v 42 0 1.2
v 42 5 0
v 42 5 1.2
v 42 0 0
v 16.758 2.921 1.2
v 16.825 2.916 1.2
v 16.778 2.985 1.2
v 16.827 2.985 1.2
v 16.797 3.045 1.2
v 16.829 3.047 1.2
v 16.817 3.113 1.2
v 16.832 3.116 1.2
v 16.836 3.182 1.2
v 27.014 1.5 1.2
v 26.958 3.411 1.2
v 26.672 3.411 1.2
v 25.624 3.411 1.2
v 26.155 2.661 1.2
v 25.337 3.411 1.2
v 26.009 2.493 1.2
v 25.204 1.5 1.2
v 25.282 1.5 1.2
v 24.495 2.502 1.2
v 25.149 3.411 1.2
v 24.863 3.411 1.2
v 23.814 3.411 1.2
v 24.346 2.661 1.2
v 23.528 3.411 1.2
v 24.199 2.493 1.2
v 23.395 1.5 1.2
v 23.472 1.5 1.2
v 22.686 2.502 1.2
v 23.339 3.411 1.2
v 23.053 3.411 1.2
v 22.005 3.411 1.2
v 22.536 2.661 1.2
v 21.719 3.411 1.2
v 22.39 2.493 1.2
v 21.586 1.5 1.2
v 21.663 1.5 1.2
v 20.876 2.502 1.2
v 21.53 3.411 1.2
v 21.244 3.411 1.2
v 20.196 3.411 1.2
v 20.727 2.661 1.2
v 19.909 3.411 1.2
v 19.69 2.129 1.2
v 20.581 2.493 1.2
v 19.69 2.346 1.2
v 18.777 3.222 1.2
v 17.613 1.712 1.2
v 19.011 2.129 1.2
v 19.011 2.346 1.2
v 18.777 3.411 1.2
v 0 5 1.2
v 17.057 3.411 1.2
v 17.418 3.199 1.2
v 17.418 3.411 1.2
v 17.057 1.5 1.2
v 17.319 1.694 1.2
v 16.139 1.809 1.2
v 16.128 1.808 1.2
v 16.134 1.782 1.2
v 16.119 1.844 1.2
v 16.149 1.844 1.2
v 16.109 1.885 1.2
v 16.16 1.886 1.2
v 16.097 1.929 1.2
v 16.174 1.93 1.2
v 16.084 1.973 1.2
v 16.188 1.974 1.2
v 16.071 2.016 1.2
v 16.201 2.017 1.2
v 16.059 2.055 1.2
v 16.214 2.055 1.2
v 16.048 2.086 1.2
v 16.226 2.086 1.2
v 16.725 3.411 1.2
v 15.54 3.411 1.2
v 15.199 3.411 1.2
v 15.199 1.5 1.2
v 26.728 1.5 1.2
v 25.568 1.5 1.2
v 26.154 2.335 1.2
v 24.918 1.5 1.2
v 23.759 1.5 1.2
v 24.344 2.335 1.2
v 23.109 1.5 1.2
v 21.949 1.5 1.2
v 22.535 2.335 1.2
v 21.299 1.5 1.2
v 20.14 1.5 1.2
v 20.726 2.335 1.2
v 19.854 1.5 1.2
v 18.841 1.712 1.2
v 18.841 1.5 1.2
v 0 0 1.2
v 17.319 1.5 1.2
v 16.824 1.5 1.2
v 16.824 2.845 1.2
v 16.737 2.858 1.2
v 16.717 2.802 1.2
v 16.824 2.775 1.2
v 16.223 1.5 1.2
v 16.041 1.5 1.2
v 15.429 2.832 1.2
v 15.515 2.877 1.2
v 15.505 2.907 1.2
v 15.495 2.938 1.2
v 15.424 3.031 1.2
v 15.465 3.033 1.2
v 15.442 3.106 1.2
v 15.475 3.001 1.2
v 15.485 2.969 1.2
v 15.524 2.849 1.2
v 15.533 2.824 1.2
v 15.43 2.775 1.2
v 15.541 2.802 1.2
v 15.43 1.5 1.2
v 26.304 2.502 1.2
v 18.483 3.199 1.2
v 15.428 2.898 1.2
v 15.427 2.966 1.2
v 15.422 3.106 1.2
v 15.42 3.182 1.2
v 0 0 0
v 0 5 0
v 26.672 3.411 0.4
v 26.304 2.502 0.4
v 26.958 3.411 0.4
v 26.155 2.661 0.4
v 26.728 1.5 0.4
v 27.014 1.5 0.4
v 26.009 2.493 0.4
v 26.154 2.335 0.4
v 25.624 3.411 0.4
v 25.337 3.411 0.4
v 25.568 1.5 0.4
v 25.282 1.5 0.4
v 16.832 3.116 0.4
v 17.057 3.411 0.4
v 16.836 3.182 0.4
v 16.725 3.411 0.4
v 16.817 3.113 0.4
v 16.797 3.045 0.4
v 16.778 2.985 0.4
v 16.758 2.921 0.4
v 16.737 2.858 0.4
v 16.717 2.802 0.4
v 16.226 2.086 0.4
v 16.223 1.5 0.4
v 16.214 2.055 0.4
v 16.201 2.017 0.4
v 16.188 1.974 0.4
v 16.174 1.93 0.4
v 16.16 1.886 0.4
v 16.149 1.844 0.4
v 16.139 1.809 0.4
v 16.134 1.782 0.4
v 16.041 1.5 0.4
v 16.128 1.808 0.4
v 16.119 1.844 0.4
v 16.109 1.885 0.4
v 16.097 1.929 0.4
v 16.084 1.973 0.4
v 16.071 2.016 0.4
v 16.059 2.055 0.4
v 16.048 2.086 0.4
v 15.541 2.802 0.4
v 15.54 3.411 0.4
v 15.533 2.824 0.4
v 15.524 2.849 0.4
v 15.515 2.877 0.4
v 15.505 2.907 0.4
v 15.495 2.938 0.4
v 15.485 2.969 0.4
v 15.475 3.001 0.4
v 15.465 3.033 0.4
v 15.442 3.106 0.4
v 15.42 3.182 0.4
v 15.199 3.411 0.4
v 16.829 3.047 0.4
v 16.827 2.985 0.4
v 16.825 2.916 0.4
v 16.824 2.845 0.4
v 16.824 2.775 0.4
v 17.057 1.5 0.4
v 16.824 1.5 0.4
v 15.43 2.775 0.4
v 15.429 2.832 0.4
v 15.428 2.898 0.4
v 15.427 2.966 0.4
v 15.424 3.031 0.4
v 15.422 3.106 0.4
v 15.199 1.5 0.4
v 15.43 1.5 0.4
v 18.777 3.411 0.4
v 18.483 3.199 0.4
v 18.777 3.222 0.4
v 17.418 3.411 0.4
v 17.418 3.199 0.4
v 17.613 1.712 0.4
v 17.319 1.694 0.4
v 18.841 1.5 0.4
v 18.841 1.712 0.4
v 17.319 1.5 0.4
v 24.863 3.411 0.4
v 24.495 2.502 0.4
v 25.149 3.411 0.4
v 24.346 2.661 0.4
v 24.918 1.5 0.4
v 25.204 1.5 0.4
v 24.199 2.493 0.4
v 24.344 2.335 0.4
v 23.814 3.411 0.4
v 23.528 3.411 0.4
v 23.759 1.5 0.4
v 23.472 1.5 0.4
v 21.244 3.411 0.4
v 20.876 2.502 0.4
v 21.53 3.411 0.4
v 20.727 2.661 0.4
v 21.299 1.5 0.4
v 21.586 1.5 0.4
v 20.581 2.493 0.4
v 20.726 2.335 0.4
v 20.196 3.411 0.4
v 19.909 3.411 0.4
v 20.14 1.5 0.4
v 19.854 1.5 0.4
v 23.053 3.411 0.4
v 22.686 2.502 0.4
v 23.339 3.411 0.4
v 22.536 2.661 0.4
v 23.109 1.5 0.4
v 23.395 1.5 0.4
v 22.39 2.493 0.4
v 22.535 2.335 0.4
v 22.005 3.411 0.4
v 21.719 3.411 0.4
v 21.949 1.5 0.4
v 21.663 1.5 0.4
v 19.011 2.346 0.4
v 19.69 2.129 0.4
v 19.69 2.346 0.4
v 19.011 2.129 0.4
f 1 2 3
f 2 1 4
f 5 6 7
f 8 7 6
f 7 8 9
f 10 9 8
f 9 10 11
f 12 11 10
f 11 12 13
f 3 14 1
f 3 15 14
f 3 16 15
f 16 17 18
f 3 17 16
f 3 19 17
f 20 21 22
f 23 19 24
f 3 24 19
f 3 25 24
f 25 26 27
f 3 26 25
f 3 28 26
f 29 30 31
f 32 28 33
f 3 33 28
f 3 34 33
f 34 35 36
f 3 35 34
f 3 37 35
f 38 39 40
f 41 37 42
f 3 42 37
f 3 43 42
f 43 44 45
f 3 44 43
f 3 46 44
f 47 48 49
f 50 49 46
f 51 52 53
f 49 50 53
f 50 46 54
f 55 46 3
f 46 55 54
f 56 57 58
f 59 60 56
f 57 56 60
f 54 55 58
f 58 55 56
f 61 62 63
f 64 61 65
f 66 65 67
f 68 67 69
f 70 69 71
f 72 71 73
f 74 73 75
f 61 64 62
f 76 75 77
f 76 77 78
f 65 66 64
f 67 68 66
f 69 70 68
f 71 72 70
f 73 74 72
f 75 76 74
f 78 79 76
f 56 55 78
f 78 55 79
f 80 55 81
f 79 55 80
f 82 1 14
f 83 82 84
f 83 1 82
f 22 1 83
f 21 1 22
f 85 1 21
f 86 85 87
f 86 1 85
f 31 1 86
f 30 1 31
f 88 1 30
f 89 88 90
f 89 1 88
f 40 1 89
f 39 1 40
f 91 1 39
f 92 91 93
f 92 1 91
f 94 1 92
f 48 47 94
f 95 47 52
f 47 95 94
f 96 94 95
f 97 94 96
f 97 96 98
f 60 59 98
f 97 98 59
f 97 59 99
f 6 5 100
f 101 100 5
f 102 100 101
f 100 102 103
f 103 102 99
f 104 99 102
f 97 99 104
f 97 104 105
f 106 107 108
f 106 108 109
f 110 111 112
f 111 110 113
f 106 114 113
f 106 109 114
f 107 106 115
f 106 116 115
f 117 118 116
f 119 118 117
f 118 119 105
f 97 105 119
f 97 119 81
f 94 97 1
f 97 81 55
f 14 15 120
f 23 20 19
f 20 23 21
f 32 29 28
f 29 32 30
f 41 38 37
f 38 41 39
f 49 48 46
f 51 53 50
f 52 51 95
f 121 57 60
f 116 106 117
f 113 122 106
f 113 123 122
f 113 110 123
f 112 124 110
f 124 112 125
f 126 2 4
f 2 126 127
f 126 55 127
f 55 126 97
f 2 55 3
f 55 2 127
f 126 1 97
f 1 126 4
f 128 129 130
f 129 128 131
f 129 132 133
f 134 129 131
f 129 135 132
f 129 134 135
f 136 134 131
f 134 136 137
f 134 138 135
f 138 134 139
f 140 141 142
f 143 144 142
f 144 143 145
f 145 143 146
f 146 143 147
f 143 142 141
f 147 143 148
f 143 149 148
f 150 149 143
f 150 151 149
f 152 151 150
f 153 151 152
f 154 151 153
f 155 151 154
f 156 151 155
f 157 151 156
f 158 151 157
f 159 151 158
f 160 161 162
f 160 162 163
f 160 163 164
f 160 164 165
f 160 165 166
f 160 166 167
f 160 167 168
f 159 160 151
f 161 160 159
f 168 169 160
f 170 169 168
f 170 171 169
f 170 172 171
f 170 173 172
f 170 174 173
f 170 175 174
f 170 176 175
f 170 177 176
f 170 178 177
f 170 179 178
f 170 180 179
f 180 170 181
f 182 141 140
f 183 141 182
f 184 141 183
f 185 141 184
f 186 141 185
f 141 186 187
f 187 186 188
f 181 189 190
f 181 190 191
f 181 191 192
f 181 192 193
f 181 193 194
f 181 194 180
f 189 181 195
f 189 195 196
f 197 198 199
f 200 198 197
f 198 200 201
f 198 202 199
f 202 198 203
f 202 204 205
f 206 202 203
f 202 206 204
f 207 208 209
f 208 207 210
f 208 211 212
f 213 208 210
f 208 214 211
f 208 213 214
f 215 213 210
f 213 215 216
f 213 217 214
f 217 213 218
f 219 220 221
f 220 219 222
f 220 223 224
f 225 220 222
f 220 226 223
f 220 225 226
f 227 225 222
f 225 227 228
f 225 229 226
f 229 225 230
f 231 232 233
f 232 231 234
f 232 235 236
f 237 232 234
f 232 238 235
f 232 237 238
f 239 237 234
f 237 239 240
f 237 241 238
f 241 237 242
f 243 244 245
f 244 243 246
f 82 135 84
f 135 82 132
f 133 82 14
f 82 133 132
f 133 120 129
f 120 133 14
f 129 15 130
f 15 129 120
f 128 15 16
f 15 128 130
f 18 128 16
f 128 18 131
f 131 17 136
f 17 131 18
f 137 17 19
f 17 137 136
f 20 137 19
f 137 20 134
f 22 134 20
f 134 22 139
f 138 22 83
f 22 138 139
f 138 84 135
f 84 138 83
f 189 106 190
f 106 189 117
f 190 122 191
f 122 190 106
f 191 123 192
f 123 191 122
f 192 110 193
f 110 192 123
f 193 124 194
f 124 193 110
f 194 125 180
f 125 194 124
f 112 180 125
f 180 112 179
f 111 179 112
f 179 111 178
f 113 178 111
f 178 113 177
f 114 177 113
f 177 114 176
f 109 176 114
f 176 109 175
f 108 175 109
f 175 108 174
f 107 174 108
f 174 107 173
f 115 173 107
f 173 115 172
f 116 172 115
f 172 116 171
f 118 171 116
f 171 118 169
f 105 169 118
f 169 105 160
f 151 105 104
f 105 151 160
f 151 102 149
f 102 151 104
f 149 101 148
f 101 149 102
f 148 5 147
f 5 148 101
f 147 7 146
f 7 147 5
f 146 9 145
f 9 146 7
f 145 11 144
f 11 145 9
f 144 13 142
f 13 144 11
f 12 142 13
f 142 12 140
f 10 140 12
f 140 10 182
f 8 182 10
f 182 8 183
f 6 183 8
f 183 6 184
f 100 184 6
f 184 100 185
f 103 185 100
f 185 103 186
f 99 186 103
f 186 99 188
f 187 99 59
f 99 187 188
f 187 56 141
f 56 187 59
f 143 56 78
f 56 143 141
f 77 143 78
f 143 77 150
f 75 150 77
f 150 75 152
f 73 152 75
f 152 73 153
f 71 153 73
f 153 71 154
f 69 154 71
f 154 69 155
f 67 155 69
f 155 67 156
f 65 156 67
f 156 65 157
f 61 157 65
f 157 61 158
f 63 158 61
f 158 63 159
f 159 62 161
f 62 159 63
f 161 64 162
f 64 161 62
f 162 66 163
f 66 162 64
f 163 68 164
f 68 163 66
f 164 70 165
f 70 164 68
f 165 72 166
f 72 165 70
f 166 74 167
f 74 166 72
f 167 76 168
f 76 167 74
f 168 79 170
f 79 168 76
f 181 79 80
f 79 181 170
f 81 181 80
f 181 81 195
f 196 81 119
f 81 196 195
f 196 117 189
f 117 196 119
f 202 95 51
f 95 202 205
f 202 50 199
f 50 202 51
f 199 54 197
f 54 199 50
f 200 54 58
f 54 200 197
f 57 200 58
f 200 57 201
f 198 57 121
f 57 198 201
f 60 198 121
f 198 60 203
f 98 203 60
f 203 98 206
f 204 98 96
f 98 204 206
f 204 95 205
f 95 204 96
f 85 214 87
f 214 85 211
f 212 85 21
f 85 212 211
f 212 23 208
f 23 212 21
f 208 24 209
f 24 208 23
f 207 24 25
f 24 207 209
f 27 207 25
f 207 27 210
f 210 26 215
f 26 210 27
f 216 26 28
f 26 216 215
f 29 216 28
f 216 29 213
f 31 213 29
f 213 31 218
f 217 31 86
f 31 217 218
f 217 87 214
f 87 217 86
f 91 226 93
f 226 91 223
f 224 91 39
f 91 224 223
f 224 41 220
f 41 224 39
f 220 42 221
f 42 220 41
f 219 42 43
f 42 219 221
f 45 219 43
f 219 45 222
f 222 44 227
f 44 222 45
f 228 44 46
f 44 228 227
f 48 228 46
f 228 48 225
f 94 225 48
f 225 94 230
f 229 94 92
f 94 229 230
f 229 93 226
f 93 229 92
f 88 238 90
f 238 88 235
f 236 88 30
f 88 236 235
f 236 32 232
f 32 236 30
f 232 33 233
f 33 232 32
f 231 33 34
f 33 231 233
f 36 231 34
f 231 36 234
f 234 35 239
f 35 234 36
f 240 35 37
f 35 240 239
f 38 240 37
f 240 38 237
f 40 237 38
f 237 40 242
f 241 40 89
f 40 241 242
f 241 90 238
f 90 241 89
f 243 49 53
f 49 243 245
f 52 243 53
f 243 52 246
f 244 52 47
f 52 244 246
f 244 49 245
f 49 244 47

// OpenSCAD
image_file = "input.png"; 
text_id = "MZ-XXXX"; 
size_x = 42; size_y = 45; // Dia-Maße

union() {
    translate([2, 5, 0]) scale([38/100, 38/100, 1])
    surface(file = image_file, center = false, convexity = 5);
    difference() {
        cube([size_x, 5, 1.2]);
        translate([size_x/2, 1.5, 0.4])
        linear_extrude(1) text(text_id, size=2, halign="center"); // ID im Fenster[cite: 2]
    }
}
